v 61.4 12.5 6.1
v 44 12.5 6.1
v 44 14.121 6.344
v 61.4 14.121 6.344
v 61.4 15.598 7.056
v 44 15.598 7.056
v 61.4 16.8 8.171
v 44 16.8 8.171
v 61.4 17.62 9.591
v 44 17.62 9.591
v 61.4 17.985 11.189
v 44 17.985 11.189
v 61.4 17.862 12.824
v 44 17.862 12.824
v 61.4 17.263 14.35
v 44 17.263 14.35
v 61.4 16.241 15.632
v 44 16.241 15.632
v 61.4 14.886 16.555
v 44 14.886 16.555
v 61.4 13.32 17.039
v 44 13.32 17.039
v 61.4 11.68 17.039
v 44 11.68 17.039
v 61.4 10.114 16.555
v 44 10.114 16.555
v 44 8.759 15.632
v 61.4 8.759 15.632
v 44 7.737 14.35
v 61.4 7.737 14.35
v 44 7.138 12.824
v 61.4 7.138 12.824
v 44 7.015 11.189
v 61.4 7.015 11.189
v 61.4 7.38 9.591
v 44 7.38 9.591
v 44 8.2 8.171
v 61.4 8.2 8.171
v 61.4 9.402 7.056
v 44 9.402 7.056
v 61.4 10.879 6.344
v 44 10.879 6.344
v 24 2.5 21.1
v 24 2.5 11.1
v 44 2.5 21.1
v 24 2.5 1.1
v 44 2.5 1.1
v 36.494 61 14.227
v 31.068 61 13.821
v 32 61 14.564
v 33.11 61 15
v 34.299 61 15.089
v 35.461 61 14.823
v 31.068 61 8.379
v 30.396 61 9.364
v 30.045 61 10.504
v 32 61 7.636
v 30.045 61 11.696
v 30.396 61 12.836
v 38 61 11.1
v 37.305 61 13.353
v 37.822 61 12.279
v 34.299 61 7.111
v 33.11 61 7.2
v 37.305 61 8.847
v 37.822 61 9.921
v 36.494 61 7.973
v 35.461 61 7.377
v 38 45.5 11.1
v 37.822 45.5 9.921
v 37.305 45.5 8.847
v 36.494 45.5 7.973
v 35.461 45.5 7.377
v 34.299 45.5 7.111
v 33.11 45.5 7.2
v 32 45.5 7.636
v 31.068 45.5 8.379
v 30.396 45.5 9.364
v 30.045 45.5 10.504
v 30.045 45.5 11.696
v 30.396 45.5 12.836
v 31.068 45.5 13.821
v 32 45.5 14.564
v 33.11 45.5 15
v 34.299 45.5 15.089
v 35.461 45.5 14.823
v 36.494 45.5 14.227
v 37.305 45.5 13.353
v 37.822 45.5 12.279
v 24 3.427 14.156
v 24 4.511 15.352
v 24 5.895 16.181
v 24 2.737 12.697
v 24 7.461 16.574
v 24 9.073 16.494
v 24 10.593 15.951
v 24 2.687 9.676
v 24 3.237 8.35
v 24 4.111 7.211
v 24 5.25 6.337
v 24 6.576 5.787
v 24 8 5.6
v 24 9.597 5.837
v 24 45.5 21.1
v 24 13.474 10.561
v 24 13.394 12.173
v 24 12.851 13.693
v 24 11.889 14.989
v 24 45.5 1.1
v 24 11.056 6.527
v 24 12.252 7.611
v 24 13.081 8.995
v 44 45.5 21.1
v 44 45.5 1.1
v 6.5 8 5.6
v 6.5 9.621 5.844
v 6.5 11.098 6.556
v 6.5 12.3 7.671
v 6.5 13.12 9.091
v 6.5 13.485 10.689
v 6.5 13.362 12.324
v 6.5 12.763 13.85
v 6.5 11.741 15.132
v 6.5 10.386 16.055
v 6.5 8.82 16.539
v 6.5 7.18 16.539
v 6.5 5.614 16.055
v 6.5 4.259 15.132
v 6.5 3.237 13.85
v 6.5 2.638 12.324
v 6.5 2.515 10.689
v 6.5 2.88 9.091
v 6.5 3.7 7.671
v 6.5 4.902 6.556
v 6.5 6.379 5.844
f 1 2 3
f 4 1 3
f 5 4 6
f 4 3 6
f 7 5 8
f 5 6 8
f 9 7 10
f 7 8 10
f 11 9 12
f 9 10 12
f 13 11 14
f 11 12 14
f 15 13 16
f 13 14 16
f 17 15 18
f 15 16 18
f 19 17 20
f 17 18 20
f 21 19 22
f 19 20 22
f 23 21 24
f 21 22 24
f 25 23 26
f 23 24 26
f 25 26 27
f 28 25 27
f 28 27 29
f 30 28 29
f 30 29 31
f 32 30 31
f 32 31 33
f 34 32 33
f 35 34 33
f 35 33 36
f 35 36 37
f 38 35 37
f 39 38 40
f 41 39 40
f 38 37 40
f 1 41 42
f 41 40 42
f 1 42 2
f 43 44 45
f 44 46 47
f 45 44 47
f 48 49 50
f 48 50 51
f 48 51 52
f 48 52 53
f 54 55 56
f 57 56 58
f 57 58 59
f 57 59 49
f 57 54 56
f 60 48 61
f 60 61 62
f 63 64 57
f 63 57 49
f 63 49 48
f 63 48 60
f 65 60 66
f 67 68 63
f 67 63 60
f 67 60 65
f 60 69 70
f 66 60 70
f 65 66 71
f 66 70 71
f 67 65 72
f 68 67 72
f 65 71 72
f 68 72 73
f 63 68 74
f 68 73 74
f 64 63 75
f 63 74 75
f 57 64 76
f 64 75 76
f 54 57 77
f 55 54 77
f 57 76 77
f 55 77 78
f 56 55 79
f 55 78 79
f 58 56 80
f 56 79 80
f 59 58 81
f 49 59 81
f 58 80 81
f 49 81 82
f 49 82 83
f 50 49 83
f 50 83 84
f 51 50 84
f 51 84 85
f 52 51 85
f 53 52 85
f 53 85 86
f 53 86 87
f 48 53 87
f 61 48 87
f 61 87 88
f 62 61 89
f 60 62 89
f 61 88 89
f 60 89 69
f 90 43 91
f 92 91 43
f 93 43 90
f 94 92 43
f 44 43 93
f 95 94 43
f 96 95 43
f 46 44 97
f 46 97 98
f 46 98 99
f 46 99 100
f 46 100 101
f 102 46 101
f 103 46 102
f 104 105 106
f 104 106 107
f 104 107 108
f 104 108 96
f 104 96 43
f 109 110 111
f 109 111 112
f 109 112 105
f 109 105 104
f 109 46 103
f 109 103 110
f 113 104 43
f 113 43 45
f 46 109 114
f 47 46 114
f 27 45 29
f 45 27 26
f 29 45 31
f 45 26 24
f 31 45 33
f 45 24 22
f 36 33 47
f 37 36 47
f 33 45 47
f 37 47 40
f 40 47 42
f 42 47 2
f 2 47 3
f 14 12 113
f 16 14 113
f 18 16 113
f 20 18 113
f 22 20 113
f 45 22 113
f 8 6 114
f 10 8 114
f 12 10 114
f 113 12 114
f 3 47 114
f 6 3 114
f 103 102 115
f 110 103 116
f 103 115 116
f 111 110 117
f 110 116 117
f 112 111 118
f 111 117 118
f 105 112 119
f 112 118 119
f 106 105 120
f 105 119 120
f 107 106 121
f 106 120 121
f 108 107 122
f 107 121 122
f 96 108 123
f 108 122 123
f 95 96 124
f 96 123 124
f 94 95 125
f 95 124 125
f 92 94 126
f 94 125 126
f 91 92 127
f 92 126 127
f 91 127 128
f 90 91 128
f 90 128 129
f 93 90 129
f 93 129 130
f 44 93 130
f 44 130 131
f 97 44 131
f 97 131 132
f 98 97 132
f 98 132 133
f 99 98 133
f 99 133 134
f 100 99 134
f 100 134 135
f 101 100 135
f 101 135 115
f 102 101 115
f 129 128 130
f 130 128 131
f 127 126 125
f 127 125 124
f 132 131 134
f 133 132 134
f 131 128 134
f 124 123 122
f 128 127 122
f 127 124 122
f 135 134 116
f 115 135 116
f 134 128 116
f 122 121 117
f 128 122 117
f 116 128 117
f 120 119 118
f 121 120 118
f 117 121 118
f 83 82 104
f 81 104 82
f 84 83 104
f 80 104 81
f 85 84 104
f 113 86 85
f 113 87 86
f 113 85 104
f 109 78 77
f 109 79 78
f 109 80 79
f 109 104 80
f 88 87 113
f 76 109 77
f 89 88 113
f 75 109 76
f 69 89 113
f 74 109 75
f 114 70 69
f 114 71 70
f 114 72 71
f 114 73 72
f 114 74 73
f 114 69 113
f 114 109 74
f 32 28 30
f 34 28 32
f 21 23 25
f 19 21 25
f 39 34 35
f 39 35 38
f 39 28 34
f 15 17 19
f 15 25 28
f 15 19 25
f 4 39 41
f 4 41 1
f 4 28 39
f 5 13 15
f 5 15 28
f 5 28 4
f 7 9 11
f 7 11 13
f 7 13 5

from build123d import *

# Parameters (mm, degrees)
BOX008_W                = 20
BOX008_H                = 43
BOX008_DEPTH            = 20
CYLINDER001_R           = 5.5
CYLINDER001_DEPTH       = 17.4
CYLINDER001_PITCH_ANGLE = 90
CYLINDER002_R           = 4
CYLINDER002_DEPTH       = 15.5
CYLINDER002_ROLL_ANGLE  = -90
CYLINDER_R              = 5.5
CYLINDER_DEPTH          = 17.5
CYLINDER_PITCH_ANGLE    = 90


with BuildPart() as e_valve_body:
    # Box008 → Box008 (new body)
    with BuildSketch(Plane(origin=(24, 0, 0), x_dir=(1, 0, 0), z_dir=(0, 0, 1))):
        with Locations((10, 21.5)):
            Rectangle(BOX008_W, BOX008_H)
    extrude(amount=BOX008_DEPTH)


with BuildPart() as o2out:
    # Cylinder001 → Cylinder001 (new body)
    with BuildSketch(Plane.XY):
        Circle(CYLINDER001_R)
    extrude(amount=CYLINDER001_DEPTH)


with BuildPart() as o2out_1:
    # Cylinder001 pitch: moved
    add(o2out.part.rotate(Axis((0, 0, 0), (0, 1, 0)), CYLINDER001_PITCH_ANGLE))


with BuildPart() as o2out_2:
    # Cylinder001 placement: moved
    add(o2out_1.part.moved(Location((44, 10, 10.5))))


with BuildPart() as o2sense:
    # Cylinder002 → Cylinder002 (new body)
    with BuildSketch(Plane.XY):
        Circle(CYLINDER002_R)
    extrude(amount=CYLINDER002_DEPTH)


with BuildPart() as o2sense_1:
    # Cylinder002 roll: moved
    add(o2sense.part.rotate(Axis((0, 0, 0), (1, 0, 0)), CYLINDER002_ROLL_ANGLE))


with BuildPart() as o2sense_2:
    # Cylinder002 placement: moved
    add(o2sense_1.part.moved(Location((34, 43, 10))))


with BuildPart() as e_valve:
    # Cylinder → Cylinder (new body)
    with BuildSketch(Plane.XY):
        Circle(CYLINDER_R)
    extrude(amount=CYLINDER_DEPTH)


with BuildPart() as e_valve_1:
    # Cylinder pitch: moved
    add(e_valve.part.rotate(Axis((0, 0, 0), (0, 1, 0)), CYLINDER_PITCH_ANGLE))


with BuildPart() as e_valve_2:
    # Cylinder placement: moved
    add(e_valve_1.part.moved(Location((6.5, 5.5, 10))))

    # Fusion: union e-valve body, O2out, O2sense
    add(e_valve_body.part)
    add(o2out_2.part)
    add(o2sense_2.part)


with BuildPart() as e_valve_3:
    # Fusion placement: moved
    add(e_valve_2.part.moved(Location((0, 2.5, 1.1))))


solid = e_valve_3.part
